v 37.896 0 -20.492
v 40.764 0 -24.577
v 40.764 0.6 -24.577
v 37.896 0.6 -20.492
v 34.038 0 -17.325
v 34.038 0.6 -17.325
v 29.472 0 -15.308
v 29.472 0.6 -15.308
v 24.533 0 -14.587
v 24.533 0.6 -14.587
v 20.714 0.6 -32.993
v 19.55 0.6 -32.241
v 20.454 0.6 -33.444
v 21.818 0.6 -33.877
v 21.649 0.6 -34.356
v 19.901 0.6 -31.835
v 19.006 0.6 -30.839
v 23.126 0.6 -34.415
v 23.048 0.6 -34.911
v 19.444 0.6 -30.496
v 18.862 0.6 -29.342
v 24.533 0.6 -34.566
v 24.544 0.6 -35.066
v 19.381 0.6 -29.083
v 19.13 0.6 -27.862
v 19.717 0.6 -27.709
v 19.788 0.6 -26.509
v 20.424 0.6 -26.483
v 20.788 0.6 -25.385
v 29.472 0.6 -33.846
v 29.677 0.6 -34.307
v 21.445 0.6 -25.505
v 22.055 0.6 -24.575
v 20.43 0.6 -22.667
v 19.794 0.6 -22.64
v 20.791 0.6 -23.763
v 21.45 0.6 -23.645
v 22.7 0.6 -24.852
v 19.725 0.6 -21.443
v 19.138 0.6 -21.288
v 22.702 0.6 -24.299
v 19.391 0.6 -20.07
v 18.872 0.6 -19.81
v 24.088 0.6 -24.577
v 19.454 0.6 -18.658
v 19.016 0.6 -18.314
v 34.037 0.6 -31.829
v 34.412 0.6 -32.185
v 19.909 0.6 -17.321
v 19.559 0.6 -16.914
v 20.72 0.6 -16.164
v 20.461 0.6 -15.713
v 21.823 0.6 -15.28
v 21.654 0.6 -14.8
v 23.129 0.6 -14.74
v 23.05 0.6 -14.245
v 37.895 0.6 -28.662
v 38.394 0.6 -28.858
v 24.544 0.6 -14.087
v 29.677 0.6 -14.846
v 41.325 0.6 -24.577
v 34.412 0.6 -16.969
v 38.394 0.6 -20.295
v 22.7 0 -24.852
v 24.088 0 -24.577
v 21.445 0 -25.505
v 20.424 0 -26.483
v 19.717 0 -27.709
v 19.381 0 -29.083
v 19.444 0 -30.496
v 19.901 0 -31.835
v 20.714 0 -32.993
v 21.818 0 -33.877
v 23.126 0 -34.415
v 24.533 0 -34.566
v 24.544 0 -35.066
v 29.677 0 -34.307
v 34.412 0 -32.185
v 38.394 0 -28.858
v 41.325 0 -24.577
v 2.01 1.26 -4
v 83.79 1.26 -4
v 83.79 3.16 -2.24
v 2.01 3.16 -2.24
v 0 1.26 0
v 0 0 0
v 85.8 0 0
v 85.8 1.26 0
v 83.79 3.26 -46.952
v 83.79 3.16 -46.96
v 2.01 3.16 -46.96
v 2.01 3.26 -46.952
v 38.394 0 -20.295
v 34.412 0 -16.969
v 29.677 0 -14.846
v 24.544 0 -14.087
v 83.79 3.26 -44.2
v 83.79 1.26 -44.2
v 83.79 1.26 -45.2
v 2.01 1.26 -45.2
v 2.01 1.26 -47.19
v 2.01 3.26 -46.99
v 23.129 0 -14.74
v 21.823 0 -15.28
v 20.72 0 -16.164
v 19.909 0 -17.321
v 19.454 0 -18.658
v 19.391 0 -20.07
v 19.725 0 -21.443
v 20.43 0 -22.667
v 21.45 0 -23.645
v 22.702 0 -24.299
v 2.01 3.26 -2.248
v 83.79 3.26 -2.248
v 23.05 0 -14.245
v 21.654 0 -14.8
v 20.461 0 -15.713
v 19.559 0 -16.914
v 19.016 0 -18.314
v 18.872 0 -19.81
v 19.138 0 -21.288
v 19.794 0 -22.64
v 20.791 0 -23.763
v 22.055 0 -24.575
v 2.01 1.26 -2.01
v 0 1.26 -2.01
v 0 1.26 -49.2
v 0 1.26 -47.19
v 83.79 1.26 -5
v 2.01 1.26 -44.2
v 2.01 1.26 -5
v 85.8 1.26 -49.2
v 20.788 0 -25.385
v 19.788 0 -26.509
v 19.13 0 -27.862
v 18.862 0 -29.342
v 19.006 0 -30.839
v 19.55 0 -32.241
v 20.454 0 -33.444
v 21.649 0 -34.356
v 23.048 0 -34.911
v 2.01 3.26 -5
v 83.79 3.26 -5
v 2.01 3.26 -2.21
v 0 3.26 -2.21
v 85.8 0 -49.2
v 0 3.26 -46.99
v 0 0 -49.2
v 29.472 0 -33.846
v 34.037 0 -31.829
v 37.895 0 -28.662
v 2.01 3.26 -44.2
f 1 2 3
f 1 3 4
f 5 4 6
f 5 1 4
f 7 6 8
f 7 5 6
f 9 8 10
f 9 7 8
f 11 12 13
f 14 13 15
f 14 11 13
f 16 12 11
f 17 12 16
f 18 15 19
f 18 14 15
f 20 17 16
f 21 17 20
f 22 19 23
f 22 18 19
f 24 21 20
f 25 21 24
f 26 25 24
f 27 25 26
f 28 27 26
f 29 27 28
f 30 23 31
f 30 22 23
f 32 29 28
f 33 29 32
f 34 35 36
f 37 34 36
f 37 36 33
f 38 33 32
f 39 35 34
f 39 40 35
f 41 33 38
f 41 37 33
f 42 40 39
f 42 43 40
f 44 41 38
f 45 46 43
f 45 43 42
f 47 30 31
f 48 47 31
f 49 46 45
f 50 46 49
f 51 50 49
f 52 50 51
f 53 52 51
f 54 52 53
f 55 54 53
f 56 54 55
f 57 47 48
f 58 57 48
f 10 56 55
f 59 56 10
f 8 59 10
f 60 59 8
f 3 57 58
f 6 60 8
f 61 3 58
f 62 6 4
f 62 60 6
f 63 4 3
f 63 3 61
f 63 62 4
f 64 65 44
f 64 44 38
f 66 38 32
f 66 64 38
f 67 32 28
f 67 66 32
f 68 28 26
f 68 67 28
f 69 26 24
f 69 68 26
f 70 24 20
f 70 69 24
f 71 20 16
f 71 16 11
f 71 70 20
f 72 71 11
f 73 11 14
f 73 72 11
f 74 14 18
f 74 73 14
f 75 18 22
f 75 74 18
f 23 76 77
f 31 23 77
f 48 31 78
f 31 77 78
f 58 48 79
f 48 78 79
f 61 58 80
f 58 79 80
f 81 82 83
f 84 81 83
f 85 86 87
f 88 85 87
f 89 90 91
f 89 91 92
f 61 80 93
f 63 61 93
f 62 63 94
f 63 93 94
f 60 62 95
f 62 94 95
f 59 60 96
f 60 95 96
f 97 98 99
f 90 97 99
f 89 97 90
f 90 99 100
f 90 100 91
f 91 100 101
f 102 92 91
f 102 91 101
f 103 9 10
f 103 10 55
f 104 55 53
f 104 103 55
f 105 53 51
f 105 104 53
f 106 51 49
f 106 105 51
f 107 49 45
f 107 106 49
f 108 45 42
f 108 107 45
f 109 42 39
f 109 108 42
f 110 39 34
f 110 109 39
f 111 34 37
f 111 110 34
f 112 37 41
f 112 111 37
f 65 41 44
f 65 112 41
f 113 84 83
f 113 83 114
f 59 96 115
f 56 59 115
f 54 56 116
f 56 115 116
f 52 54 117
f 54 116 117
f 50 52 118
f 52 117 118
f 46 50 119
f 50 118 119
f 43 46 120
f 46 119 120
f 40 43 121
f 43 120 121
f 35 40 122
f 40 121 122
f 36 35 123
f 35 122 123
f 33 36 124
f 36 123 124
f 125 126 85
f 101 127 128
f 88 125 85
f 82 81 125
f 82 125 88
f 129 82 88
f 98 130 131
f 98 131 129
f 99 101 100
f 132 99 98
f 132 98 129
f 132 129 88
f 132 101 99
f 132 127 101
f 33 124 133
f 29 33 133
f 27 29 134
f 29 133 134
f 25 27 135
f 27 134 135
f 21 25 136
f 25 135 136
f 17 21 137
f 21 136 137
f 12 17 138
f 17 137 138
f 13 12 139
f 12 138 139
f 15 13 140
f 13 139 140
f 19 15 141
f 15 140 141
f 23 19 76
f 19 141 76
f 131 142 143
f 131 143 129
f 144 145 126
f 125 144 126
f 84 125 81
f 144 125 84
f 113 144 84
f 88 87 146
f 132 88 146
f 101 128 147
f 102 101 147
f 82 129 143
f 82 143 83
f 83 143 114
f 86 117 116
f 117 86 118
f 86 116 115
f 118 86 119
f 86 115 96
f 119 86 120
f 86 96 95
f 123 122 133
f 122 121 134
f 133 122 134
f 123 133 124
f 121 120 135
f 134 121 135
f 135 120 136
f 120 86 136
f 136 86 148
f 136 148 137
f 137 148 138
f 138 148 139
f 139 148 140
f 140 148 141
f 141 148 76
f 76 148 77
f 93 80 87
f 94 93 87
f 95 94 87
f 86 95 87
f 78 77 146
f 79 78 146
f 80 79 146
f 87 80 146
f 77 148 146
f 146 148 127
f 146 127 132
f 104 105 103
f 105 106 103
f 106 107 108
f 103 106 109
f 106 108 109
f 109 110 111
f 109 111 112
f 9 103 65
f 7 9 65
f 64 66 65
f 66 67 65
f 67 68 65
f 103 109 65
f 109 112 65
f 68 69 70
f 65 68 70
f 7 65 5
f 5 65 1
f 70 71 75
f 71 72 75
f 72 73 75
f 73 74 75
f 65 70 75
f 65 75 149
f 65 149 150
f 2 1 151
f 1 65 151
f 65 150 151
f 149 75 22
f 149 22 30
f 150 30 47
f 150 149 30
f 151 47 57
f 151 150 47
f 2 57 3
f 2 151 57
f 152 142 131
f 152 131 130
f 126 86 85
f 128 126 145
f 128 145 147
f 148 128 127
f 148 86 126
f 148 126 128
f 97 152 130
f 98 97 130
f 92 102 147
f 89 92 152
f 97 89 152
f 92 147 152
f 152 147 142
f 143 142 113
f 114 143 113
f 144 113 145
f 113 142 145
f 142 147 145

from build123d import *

# Parameters (mm, degrees)
ESBO_O1_W                = 85.8
ESBO_O1_H                = 49.2
RESSALTO_EXTRUS_O1_DEPTH = 1.26
RESSALTO_EXTRUS_O5_DEPTH = 2.01
RESSALTO_EXTRUS_O6_REACH = 102.969
RESSALTO_EXTRUS_O6_START = -2.01
CORTE_EXTRUS_O4_DEPTH    = 0.6


with BuildPart() as part:
    # Esboço1 → Ressalto-extrusão1 (new body)
    with BuildSketch(Plane(origin=(0, 0, 0), x_dir=(1, 0, 0), z_dir=(0, 1, 0))):
        with Locations((42.9, 24.6)):
            Rectangle(ESBO_O1_W, ESBO_O1_H)
    extrude(amount=RESSALTO_EXTRUS_O1_DEPTH)

    # Esboço9 → Ressalto-extrusão5 (add)
    with BuildSketch(Plane.ZY):
        Polygon((-47.19, 1.26), (-46.989750156, 3.26), (-2.210249844, 3.26), (-2.01, 1.26), align=None)
    extrude(amount=-RESSALTO_EXTRUS_O5_DEPTH)

    # Esboço11 → Ressalto-extrusão6 (add, up to next)
    with BuildSketch(Plane(origin=(85.8, 0, 0), x_dir=(0, 0, -1), z_dir=(1, 0, 0)).offset(RESSALTO_EXTRUS_O6_START), mode=Mode.PRIVATE) as ressalto_extrus_o6_sk1:
        Polygon((44.2, 1.26), (45.2, 1.26), (46.959846557, 3.16027369), (46.952453114, 3.26), (44.2, 3.26), align=None)
    ressalto_extrus_o6_tool1 = extrude(ressalto_extrus_o6_sk1.sketch, amount=-RESSALTO_EXTRUS_O6_REACH, mode=Mode.PRIVATE) - part.part
    # Esboço11 → Ressalto-extrusão6 (add, up to next)
    with BuildSketch(Plane(origin=(85.8, 0, 0), x_dir=(0, 0, -1), z_dir=(1, 0, 0)).offset(RESSALTO_EXTRUS_O6_START), mode=Mode.PRIVATE) as ressalto_extrus_o6_sk2:
        Polygon((5, 3.26), (5, 1.26), (4, 1.26), (2.240153443, 3.16027369), (2.247546886, 3.26), align=None)
    ressalto_extrus_o6_tool2 = extrude(ressalto_extrus_o6_sk2.sketch, amount=-RESSALTO_EXTRUS_O6_REACH, mode=Mode.PRIVATE) - part.part
    add(ressalto_extrus_o6_tool1.solids().sort_by_distance((83.79, 2.41923, -45.235001))[0])
    add(ressalto_extrus_o6_tool2.solids().sort_by_distance((83.79, 2.41923, -3.964999))[0])

    # Esboço8 → Corte-extrusão4 (cut)
    with BuildSketch(Plane.XZ):
        with BuildLine():
            ThreePointArc((22.054636183, -24.574784692), (19.006183567, -30.839043664), (24.543756305, -35.066252199))
            ThreePointArc((24.543756305, -35.066252199), (34.411504106, -32.18495748), (41.324551108, -24.576798237))
            ThreePointArc((41.324551108, -24.576798237), (34.411504106, -16.968638994), (24.543756305, -14.087344275))
            ThreePointArc((24.543756305, -14.087344275), (19.015675216, -18.314400935), (22.054636183, -24.574784692))
        make_face()
        with BuildLine():
            ThreePointArc((24.533243249, -14.587267716), (19.371981333, -19.36170914), (24.08768254, -24.576695007))
            ThreePointArc((24.08768254, -24.576695007), (19.36258934, -29.791975707), (24.532809194, -34.566332751))
            ThreePointArc((24.532809194, -34.566332751), (34.03743393, -31.828610978), (40.763816601, -24.576798237))
            ThreePointArc((40.763816601, -24.576798237), (34.037618764, -17.325099255), (24.533243249, -14.587267716))
        make_face(mode=Mode.SUBTRACT)
    extrude(amount=-CORTE_EXTRUS_O4_DEPTH, mode=Mode.SUBTRACT)


solid = part.part
